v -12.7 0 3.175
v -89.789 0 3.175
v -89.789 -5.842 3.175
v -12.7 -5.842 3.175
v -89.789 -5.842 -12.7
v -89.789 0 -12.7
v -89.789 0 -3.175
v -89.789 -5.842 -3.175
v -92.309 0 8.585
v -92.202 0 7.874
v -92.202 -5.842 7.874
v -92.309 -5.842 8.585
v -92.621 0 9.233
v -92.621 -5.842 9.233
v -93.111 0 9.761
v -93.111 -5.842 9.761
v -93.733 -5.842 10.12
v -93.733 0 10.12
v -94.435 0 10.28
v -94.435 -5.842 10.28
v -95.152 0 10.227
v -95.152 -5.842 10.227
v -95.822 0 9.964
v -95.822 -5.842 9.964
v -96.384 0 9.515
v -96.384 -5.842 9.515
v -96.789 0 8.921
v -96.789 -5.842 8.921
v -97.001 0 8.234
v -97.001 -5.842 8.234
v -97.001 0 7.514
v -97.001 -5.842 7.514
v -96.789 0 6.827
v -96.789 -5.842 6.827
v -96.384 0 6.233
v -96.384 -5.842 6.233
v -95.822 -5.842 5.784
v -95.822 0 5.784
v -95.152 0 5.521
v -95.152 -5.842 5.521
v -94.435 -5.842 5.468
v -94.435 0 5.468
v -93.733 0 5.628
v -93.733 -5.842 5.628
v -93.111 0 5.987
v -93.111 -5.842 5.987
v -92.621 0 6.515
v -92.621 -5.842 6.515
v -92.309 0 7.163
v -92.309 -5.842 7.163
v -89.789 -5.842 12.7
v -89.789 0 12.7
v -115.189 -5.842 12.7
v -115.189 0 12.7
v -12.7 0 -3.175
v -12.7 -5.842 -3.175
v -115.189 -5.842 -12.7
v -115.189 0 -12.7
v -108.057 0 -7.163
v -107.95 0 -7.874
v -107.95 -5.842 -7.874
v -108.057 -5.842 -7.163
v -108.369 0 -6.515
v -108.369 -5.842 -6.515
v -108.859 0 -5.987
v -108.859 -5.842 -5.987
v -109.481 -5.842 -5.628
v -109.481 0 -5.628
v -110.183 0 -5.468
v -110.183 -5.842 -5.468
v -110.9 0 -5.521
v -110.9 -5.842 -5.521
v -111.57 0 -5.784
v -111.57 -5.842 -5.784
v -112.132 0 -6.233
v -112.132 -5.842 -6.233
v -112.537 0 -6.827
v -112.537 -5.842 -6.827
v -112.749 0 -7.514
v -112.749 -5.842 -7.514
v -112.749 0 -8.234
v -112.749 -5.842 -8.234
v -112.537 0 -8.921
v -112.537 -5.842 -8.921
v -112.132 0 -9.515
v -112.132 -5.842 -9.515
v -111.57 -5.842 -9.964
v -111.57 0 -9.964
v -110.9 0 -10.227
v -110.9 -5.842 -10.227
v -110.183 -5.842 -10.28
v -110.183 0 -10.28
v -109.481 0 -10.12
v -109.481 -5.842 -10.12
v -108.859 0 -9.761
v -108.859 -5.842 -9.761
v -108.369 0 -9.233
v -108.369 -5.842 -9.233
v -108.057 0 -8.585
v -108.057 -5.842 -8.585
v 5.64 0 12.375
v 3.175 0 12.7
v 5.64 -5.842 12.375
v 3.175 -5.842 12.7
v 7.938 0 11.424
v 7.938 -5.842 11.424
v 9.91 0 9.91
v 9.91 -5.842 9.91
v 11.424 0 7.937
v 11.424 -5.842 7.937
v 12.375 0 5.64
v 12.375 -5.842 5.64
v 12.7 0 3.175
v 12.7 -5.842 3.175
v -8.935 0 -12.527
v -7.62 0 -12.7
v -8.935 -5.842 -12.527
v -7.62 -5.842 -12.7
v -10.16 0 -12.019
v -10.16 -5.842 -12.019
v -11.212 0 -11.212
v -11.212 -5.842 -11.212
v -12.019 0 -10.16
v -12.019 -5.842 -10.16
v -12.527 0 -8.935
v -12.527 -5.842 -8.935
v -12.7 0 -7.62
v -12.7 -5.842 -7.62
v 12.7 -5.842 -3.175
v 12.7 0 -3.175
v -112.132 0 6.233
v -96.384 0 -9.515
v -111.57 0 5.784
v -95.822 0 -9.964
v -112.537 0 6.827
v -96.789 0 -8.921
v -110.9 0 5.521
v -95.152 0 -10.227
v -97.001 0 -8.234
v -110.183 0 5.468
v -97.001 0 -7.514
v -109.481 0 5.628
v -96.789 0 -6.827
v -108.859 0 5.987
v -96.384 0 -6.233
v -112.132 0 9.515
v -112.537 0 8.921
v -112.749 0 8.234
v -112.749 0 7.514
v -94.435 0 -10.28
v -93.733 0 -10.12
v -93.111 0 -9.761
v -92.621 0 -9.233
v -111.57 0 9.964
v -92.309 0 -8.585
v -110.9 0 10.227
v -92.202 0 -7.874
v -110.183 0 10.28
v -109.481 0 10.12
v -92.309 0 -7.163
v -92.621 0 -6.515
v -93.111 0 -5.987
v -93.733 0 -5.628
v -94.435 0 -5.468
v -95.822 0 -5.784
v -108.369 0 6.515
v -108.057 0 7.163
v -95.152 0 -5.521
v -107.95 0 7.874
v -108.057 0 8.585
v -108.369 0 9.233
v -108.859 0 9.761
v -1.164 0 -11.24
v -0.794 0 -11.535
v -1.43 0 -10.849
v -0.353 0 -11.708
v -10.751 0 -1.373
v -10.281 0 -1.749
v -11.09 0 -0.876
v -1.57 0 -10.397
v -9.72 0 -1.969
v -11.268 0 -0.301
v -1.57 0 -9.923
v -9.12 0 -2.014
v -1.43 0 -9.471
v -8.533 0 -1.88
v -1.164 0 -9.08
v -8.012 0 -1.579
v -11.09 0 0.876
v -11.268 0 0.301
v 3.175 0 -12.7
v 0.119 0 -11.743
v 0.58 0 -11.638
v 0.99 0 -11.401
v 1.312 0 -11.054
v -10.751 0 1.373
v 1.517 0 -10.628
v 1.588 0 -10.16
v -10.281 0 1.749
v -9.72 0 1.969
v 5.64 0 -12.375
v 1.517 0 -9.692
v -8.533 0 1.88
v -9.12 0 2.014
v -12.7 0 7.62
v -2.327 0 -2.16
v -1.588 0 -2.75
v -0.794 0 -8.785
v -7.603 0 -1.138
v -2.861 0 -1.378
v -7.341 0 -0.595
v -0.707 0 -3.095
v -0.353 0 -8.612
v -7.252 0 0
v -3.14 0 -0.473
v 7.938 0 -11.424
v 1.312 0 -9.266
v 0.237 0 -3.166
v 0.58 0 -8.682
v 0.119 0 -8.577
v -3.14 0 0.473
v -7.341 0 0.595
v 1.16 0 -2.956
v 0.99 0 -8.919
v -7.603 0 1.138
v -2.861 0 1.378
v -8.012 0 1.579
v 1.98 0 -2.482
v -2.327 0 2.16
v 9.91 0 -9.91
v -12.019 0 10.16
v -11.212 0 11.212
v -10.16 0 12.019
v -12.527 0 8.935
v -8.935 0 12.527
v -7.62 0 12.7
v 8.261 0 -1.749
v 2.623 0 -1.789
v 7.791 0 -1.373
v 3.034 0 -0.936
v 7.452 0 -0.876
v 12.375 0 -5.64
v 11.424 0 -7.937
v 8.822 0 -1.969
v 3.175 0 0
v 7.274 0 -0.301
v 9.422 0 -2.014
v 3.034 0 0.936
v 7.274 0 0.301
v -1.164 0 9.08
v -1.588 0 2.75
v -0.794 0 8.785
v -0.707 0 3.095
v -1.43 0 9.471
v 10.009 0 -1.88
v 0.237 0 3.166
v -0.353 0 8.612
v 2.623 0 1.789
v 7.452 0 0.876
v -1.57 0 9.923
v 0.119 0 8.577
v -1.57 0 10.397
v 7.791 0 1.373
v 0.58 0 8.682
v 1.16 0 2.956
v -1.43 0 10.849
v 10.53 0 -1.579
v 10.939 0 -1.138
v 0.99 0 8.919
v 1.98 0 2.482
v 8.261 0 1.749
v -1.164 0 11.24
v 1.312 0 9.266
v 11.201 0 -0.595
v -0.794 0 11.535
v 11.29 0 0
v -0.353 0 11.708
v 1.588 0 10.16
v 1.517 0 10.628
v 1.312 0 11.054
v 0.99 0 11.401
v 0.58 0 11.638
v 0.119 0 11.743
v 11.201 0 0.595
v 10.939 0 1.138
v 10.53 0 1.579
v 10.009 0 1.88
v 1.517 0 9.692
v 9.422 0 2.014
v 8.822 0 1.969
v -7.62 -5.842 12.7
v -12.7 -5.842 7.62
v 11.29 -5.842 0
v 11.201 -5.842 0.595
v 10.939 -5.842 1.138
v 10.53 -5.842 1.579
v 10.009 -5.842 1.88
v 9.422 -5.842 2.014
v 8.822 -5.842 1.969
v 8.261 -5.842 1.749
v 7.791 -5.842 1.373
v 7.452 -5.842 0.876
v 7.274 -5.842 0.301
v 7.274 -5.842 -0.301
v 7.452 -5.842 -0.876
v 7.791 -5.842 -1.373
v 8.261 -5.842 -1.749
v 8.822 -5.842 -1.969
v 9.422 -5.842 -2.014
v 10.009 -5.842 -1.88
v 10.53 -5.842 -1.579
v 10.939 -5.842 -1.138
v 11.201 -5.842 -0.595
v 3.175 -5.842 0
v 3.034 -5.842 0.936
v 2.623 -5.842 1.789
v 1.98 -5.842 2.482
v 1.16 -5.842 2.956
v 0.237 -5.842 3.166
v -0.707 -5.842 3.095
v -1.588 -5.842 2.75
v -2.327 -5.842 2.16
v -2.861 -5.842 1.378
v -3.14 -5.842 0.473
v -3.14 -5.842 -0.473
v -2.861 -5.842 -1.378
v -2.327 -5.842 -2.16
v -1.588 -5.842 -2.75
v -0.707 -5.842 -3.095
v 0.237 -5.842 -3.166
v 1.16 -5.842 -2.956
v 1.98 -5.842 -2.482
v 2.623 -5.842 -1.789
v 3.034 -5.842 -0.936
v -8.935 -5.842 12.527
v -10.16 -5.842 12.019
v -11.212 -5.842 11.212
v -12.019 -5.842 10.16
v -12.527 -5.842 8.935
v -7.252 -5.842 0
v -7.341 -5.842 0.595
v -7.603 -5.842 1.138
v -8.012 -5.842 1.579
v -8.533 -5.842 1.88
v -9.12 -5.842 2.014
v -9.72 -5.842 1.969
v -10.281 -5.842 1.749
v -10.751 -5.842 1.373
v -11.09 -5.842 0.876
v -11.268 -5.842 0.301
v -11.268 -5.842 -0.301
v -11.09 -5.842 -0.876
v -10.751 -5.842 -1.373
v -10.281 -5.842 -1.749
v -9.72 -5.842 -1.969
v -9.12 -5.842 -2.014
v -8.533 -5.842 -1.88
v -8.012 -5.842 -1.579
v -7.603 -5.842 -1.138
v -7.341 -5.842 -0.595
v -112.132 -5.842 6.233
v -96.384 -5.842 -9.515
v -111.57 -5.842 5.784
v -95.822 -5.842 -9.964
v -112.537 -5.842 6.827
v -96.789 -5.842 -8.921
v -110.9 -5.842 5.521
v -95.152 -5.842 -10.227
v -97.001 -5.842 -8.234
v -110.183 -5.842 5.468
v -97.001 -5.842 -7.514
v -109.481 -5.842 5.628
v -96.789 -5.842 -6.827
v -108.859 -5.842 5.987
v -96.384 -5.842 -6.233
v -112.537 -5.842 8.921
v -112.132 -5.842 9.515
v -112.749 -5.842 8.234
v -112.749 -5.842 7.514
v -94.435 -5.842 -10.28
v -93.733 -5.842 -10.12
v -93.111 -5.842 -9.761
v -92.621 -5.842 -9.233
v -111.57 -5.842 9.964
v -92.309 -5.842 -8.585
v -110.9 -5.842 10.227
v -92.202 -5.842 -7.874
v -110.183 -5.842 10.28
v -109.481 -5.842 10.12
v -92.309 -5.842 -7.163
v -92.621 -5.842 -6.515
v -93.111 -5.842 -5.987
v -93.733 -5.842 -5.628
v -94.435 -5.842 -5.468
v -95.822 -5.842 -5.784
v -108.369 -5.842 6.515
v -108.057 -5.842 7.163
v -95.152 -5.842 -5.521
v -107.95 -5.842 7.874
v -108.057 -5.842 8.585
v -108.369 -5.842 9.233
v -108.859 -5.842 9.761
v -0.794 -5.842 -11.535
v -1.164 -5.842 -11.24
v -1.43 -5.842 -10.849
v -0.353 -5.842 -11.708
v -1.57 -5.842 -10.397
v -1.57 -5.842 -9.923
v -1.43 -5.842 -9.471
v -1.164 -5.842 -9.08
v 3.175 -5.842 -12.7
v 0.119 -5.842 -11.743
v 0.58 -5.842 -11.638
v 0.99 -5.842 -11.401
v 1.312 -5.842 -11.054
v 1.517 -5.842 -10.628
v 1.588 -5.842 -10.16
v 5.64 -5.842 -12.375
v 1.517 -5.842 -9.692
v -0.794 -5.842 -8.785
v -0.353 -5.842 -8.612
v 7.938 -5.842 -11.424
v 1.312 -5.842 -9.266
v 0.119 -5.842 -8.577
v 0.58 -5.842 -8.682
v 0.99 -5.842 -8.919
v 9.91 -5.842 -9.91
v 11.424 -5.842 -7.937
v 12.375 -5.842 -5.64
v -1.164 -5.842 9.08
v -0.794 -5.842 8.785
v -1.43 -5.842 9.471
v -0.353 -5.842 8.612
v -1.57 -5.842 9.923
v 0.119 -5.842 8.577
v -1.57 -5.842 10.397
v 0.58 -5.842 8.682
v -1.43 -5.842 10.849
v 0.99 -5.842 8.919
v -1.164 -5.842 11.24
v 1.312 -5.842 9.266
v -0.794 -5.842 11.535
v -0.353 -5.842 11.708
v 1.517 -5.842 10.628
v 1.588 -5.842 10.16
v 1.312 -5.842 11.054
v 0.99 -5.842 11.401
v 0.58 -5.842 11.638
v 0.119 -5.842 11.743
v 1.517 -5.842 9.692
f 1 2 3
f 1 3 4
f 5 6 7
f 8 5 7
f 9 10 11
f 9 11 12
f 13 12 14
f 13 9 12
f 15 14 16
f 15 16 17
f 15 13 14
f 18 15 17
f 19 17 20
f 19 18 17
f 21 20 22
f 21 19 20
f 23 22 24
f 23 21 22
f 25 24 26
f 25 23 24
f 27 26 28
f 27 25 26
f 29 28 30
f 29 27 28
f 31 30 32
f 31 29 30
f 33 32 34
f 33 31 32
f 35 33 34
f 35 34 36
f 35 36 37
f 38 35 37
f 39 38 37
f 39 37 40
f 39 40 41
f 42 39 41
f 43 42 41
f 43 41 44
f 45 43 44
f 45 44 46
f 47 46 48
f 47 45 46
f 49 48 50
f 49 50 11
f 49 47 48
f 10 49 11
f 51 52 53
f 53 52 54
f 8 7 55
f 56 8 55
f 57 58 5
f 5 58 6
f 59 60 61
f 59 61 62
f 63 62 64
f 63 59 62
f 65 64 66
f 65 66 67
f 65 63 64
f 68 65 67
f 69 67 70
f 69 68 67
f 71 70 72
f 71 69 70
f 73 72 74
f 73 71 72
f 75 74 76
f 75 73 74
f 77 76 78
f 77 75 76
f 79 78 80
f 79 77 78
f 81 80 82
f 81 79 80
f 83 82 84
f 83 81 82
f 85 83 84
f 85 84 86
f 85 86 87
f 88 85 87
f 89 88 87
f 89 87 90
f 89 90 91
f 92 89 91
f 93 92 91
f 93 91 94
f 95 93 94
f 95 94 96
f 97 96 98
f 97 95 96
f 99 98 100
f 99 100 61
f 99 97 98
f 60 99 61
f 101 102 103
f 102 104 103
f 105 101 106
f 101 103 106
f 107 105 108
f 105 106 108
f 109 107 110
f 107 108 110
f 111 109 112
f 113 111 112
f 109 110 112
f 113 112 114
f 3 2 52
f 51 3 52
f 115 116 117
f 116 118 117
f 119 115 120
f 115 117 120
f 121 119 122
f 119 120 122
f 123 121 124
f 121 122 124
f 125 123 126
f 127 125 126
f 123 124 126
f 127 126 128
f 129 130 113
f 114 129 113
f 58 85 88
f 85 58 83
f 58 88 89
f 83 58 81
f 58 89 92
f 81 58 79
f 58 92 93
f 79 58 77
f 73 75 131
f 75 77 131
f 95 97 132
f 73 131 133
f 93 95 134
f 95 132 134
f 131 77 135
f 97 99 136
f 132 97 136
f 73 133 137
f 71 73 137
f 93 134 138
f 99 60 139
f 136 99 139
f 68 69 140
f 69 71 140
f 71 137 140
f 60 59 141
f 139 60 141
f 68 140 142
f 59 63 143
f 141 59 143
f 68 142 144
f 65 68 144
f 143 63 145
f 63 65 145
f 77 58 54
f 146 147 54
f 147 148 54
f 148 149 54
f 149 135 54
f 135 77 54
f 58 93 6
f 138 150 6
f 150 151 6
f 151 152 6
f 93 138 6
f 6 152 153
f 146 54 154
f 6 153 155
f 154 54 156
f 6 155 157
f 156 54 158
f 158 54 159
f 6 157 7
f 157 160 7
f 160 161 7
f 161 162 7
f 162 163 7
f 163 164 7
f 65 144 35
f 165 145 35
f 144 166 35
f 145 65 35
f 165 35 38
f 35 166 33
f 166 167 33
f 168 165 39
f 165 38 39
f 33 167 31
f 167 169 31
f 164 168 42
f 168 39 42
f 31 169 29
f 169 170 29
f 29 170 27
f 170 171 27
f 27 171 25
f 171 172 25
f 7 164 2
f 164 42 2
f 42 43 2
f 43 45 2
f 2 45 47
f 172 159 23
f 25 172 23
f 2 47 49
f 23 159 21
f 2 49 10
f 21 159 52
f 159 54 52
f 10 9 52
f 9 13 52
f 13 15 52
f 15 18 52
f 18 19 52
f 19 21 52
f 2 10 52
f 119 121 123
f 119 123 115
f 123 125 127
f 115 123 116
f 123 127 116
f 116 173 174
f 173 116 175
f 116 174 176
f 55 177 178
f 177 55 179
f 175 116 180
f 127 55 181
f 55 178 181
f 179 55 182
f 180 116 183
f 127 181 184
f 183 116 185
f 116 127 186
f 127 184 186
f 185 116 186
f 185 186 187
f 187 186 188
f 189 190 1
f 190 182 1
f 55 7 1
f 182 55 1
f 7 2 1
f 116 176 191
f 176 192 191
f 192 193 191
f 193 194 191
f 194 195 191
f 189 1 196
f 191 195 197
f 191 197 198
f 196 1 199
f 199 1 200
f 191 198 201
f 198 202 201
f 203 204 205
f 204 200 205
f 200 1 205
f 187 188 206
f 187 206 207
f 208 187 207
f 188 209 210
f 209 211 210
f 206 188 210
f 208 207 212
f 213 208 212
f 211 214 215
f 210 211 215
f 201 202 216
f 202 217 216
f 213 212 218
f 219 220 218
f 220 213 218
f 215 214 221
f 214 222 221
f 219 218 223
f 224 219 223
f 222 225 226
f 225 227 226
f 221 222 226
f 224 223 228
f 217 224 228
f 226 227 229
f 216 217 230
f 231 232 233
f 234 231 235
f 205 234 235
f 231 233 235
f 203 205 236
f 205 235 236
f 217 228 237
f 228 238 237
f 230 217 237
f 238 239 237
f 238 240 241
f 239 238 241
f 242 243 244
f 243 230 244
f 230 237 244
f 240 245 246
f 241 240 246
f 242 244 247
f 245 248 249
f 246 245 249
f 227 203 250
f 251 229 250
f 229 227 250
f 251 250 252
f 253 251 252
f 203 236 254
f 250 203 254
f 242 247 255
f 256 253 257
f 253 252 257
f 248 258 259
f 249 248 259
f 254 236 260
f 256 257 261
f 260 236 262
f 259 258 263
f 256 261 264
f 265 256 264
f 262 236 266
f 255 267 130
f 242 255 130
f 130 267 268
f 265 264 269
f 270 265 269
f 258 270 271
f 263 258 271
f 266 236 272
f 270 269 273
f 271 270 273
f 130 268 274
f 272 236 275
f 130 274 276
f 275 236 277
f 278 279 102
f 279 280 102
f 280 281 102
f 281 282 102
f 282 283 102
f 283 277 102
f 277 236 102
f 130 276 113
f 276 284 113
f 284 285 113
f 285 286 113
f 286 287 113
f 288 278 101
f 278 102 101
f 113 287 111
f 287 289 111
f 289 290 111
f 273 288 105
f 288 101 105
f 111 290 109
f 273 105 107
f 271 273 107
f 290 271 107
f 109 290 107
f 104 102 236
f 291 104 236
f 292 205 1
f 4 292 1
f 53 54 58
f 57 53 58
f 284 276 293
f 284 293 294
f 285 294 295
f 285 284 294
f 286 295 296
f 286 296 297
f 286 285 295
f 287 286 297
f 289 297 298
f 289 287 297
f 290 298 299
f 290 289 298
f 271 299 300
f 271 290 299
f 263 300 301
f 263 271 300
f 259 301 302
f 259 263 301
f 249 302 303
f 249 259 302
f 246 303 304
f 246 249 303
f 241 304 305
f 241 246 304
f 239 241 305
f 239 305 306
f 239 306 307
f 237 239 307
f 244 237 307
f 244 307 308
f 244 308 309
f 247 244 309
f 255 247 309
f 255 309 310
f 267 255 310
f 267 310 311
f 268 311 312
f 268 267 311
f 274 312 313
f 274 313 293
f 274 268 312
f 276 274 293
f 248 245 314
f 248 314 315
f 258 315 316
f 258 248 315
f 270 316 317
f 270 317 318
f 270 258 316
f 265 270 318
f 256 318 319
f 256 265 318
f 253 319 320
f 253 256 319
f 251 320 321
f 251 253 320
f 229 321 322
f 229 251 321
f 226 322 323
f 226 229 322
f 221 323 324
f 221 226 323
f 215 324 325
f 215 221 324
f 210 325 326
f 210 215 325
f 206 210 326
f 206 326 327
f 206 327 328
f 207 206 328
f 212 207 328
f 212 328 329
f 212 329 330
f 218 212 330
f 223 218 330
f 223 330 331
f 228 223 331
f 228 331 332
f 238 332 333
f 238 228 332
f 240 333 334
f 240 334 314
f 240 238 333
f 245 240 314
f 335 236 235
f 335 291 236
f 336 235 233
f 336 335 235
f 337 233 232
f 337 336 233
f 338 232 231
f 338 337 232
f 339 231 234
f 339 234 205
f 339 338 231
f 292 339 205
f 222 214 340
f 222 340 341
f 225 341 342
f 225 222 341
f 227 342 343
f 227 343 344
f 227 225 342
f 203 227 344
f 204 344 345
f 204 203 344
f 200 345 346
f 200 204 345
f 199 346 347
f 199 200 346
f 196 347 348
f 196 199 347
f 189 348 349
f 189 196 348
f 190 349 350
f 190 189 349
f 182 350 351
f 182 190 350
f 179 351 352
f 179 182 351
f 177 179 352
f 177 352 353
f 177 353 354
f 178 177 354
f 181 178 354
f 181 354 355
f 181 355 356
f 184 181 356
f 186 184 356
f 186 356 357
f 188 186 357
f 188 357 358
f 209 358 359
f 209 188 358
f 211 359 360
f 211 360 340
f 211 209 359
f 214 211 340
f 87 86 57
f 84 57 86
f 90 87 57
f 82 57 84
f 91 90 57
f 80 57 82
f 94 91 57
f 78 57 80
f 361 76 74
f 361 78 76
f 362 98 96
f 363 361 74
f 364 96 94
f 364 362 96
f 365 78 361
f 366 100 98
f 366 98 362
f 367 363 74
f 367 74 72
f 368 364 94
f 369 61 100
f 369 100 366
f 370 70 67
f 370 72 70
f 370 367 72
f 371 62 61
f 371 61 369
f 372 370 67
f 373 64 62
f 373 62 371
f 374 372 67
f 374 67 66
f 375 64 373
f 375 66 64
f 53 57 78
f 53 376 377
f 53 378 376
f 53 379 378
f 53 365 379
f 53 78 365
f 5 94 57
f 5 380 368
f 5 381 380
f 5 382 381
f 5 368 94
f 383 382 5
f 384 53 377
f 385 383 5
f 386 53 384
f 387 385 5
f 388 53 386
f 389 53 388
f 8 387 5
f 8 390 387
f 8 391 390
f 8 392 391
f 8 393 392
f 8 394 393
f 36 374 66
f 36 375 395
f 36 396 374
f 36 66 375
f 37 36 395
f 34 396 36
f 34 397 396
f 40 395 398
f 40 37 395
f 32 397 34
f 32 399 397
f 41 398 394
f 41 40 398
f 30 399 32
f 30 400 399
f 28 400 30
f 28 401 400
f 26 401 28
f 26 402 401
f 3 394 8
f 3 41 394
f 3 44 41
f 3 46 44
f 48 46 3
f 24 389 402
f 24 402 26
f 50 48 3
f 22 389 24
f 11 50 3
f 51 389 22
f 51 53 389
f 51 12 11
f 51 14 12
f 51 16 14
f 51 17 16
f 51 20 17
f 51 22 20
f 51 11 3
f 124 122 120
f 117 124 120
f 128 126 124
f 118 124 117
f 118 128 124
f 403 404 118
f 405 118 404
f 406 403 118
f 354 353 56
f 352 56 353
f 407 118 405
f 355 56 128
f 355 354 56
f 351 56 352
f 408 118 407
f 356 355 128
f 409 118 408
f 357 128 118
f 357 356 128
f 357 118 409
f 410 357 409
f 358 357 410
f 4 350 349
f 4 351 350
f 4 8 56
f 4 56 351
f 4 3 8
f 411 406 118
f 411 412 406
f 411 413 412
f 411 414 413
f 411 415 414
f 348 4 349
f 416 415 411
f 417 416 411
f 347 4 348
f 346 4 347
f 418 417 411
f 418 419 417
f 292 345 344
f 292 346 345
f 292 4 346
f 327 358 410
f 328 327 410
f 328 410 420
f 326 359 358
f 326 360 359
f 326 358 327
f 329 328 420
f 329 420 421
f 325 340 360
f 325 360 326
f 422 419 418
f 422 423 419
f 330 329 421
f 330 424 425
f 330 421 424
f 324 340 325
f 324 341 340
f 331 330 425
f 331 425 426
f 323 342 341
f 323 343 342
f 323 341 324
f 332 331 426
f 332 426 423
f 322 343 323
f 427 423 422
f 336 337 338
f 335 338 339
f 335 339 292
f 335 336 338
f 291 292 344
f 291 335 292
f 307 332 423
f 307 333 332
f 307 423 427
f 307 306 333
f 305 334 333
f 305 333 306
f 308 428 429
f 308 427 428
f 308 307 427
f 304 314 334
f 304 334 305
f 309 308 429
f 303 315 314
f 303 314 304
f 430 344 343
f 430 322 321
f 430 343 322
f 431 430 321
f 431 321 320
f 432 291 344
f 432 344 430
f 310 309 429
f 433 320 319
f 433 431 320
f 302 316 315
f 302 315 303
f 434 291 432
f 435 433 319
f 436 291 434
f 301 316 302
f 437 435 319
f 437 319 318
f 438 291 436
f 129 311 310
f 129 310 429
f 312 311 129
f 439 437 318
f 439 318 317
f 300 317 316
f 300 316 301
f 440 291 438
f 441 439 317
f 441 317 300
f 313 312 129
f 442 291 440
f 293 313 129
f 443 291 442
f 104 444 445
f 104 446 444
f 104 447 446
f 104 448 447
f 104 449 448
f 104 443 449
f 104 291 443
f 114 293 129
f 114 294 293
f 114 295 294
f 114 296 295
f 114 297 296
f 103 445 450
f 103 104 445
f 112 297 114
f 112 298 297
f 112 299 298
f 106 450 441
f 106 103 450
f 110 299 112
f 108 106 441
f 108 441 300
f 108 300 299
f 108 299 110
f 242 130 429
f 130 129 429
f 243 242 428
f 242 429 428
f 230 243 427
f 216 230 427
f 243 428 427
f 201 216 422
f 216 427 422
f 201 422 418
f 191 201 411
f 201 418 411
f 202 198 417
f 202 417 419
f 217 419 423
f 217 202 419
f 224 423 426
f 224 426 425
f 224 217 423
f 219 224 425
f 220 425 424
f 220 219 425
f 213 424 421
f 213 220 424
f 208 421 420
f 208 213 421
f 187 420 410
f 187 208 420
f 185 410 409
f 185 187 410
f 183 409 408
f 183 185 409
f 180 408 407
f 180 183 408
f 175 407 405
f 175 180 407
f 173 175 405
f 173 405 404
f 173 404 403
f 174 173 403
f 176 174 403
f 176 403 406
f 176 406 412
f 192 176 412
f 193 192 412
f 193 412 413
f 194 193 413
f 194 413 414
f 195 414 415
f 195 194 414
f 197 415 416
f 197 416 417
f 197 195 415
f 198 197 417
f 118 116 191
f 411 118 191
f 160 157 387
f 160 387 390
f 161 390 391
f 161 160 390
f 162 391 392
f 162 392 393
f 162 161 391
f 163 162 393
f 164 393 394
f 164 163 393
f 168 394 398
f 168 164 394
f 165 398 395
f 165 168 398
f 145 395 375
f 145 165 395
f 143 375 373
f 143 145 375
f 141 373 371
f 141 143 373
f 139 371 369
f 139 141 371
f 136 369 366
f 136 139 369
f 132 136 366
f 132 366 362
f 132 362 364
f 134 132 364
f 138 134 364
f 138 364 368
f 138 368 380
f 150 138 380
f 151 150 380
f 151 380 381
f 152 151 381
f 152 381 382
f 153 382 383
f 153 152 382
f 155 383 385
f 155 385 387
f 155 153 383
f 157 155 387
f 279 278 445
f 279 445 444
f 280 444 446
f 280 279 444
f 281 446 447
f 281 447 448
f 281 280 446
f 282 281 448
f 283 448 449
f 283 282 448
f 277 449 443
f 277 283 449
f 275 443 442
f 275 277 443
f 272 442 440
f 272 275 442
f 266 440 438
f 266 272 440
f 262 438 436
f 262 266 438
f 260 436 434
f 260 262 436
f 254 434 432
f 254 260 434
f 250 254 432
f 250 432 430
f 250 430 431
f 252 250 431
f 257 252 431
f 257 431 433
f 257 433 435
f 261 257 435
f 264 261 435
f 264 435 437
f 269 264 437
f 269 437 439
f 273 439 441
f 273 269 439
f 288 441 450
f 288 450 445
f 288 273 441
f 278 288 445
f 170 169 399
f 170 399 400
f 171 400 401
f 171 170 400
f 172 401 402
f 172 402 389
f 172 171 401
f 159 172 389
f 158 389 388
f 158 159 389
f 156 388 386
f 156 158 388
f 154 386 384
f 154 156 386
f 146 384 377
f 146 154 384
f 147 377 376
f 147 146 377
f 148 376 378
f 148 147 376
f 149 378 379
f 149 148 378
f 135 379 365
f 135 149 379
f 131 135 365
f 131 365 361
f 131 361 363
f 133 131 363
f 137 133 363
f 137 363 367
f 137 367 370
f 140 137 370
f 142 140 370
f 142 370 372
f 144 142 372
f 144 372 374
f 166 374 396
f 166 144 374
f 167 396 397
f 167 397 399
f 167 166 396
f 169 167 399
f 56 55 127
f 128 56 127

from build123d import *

# Parameters (mm, degrees)
F0_R     = 1.5875
F0_R_2   = 2.0193
F0_R_3   = 3.175
F0_W     = 77.089
F0_H     = 6.35
F0_R_4   = 2.413
F1_DEPTH = 5.842
F2_R     = 9.525
F3_R     = 5.08


with BuildPart() as f1:
    # F0 (on Front) → F1 (new body)
    with BuildSketch(Plane.XZ):
        Polygon((12.7, 12.7), (-12.7, 12.7), (-12.7, 3.175), (-12.7, -3.175), (-12.7, -12.7), (12.7, -12.7), align=None)
        with Locations((0, -10.16)):
            Circle(F0_R, mode=Mode.SUBTRACT)
        with Locations((-9.271, 0)):
            Circle(F0_R_2, mode=Mode.SUBTRACT)
        Circle(F0_R_3, mode=Mode.SUBTRACT)
        with Locations((9.271, 0)):
            Circle(F0_R_2, mode=Mode.SUBTRACT)
        with Locations((0, 10.16)):
            Circle(F0_R, mode=Mode.SUBTRACT)
        with Locations((-51.2445, 0)):
            Rectangle(F0_W, F0_H)
        Polygon((-89.789, -3.175), (-89.789, 3.175), (-89.789, 12.7), (-115.189, 12.7), (-115.189, -12.7), (-89.789, -12.7), align=None)
        with Locations((-110.363, -7.874)):
            Circle(F0_R_4, mode=Mode.SUBTRACT)
        with Locations((-94.615, -7.874)):
            Circle(F0_R_4, mode=Mode.SUBTRACT)
        with Locations((-110.363, 7.874)):
            Circle(F0_R_4, mode=Mode.SUBTRACT)
        with Locations((-94.615, 7.874)):
            Circle(F0_R_4, mode=Mode.SUBTRACT)
    extrude(amount=F1_DEPTH)

    # F2
    f2_edges = [f1.edges().sort_by_distance(p)[0] for p in [
        (12.7, -2.921, 12.7),
        (12.7, -2.921, -12.7),
    ]]
    fillet(f2_edges, radius=F2_R)

    # F3
    f3_edges = [f1.edges().sort_by_distance(p)[0] for p in [
        (-12.7, -2.921, -12.7),
        (-12.7, -2.921, 12.7),
    ]]
    fillet(f3_edges, radius=F3_R)


solid = f1.part
